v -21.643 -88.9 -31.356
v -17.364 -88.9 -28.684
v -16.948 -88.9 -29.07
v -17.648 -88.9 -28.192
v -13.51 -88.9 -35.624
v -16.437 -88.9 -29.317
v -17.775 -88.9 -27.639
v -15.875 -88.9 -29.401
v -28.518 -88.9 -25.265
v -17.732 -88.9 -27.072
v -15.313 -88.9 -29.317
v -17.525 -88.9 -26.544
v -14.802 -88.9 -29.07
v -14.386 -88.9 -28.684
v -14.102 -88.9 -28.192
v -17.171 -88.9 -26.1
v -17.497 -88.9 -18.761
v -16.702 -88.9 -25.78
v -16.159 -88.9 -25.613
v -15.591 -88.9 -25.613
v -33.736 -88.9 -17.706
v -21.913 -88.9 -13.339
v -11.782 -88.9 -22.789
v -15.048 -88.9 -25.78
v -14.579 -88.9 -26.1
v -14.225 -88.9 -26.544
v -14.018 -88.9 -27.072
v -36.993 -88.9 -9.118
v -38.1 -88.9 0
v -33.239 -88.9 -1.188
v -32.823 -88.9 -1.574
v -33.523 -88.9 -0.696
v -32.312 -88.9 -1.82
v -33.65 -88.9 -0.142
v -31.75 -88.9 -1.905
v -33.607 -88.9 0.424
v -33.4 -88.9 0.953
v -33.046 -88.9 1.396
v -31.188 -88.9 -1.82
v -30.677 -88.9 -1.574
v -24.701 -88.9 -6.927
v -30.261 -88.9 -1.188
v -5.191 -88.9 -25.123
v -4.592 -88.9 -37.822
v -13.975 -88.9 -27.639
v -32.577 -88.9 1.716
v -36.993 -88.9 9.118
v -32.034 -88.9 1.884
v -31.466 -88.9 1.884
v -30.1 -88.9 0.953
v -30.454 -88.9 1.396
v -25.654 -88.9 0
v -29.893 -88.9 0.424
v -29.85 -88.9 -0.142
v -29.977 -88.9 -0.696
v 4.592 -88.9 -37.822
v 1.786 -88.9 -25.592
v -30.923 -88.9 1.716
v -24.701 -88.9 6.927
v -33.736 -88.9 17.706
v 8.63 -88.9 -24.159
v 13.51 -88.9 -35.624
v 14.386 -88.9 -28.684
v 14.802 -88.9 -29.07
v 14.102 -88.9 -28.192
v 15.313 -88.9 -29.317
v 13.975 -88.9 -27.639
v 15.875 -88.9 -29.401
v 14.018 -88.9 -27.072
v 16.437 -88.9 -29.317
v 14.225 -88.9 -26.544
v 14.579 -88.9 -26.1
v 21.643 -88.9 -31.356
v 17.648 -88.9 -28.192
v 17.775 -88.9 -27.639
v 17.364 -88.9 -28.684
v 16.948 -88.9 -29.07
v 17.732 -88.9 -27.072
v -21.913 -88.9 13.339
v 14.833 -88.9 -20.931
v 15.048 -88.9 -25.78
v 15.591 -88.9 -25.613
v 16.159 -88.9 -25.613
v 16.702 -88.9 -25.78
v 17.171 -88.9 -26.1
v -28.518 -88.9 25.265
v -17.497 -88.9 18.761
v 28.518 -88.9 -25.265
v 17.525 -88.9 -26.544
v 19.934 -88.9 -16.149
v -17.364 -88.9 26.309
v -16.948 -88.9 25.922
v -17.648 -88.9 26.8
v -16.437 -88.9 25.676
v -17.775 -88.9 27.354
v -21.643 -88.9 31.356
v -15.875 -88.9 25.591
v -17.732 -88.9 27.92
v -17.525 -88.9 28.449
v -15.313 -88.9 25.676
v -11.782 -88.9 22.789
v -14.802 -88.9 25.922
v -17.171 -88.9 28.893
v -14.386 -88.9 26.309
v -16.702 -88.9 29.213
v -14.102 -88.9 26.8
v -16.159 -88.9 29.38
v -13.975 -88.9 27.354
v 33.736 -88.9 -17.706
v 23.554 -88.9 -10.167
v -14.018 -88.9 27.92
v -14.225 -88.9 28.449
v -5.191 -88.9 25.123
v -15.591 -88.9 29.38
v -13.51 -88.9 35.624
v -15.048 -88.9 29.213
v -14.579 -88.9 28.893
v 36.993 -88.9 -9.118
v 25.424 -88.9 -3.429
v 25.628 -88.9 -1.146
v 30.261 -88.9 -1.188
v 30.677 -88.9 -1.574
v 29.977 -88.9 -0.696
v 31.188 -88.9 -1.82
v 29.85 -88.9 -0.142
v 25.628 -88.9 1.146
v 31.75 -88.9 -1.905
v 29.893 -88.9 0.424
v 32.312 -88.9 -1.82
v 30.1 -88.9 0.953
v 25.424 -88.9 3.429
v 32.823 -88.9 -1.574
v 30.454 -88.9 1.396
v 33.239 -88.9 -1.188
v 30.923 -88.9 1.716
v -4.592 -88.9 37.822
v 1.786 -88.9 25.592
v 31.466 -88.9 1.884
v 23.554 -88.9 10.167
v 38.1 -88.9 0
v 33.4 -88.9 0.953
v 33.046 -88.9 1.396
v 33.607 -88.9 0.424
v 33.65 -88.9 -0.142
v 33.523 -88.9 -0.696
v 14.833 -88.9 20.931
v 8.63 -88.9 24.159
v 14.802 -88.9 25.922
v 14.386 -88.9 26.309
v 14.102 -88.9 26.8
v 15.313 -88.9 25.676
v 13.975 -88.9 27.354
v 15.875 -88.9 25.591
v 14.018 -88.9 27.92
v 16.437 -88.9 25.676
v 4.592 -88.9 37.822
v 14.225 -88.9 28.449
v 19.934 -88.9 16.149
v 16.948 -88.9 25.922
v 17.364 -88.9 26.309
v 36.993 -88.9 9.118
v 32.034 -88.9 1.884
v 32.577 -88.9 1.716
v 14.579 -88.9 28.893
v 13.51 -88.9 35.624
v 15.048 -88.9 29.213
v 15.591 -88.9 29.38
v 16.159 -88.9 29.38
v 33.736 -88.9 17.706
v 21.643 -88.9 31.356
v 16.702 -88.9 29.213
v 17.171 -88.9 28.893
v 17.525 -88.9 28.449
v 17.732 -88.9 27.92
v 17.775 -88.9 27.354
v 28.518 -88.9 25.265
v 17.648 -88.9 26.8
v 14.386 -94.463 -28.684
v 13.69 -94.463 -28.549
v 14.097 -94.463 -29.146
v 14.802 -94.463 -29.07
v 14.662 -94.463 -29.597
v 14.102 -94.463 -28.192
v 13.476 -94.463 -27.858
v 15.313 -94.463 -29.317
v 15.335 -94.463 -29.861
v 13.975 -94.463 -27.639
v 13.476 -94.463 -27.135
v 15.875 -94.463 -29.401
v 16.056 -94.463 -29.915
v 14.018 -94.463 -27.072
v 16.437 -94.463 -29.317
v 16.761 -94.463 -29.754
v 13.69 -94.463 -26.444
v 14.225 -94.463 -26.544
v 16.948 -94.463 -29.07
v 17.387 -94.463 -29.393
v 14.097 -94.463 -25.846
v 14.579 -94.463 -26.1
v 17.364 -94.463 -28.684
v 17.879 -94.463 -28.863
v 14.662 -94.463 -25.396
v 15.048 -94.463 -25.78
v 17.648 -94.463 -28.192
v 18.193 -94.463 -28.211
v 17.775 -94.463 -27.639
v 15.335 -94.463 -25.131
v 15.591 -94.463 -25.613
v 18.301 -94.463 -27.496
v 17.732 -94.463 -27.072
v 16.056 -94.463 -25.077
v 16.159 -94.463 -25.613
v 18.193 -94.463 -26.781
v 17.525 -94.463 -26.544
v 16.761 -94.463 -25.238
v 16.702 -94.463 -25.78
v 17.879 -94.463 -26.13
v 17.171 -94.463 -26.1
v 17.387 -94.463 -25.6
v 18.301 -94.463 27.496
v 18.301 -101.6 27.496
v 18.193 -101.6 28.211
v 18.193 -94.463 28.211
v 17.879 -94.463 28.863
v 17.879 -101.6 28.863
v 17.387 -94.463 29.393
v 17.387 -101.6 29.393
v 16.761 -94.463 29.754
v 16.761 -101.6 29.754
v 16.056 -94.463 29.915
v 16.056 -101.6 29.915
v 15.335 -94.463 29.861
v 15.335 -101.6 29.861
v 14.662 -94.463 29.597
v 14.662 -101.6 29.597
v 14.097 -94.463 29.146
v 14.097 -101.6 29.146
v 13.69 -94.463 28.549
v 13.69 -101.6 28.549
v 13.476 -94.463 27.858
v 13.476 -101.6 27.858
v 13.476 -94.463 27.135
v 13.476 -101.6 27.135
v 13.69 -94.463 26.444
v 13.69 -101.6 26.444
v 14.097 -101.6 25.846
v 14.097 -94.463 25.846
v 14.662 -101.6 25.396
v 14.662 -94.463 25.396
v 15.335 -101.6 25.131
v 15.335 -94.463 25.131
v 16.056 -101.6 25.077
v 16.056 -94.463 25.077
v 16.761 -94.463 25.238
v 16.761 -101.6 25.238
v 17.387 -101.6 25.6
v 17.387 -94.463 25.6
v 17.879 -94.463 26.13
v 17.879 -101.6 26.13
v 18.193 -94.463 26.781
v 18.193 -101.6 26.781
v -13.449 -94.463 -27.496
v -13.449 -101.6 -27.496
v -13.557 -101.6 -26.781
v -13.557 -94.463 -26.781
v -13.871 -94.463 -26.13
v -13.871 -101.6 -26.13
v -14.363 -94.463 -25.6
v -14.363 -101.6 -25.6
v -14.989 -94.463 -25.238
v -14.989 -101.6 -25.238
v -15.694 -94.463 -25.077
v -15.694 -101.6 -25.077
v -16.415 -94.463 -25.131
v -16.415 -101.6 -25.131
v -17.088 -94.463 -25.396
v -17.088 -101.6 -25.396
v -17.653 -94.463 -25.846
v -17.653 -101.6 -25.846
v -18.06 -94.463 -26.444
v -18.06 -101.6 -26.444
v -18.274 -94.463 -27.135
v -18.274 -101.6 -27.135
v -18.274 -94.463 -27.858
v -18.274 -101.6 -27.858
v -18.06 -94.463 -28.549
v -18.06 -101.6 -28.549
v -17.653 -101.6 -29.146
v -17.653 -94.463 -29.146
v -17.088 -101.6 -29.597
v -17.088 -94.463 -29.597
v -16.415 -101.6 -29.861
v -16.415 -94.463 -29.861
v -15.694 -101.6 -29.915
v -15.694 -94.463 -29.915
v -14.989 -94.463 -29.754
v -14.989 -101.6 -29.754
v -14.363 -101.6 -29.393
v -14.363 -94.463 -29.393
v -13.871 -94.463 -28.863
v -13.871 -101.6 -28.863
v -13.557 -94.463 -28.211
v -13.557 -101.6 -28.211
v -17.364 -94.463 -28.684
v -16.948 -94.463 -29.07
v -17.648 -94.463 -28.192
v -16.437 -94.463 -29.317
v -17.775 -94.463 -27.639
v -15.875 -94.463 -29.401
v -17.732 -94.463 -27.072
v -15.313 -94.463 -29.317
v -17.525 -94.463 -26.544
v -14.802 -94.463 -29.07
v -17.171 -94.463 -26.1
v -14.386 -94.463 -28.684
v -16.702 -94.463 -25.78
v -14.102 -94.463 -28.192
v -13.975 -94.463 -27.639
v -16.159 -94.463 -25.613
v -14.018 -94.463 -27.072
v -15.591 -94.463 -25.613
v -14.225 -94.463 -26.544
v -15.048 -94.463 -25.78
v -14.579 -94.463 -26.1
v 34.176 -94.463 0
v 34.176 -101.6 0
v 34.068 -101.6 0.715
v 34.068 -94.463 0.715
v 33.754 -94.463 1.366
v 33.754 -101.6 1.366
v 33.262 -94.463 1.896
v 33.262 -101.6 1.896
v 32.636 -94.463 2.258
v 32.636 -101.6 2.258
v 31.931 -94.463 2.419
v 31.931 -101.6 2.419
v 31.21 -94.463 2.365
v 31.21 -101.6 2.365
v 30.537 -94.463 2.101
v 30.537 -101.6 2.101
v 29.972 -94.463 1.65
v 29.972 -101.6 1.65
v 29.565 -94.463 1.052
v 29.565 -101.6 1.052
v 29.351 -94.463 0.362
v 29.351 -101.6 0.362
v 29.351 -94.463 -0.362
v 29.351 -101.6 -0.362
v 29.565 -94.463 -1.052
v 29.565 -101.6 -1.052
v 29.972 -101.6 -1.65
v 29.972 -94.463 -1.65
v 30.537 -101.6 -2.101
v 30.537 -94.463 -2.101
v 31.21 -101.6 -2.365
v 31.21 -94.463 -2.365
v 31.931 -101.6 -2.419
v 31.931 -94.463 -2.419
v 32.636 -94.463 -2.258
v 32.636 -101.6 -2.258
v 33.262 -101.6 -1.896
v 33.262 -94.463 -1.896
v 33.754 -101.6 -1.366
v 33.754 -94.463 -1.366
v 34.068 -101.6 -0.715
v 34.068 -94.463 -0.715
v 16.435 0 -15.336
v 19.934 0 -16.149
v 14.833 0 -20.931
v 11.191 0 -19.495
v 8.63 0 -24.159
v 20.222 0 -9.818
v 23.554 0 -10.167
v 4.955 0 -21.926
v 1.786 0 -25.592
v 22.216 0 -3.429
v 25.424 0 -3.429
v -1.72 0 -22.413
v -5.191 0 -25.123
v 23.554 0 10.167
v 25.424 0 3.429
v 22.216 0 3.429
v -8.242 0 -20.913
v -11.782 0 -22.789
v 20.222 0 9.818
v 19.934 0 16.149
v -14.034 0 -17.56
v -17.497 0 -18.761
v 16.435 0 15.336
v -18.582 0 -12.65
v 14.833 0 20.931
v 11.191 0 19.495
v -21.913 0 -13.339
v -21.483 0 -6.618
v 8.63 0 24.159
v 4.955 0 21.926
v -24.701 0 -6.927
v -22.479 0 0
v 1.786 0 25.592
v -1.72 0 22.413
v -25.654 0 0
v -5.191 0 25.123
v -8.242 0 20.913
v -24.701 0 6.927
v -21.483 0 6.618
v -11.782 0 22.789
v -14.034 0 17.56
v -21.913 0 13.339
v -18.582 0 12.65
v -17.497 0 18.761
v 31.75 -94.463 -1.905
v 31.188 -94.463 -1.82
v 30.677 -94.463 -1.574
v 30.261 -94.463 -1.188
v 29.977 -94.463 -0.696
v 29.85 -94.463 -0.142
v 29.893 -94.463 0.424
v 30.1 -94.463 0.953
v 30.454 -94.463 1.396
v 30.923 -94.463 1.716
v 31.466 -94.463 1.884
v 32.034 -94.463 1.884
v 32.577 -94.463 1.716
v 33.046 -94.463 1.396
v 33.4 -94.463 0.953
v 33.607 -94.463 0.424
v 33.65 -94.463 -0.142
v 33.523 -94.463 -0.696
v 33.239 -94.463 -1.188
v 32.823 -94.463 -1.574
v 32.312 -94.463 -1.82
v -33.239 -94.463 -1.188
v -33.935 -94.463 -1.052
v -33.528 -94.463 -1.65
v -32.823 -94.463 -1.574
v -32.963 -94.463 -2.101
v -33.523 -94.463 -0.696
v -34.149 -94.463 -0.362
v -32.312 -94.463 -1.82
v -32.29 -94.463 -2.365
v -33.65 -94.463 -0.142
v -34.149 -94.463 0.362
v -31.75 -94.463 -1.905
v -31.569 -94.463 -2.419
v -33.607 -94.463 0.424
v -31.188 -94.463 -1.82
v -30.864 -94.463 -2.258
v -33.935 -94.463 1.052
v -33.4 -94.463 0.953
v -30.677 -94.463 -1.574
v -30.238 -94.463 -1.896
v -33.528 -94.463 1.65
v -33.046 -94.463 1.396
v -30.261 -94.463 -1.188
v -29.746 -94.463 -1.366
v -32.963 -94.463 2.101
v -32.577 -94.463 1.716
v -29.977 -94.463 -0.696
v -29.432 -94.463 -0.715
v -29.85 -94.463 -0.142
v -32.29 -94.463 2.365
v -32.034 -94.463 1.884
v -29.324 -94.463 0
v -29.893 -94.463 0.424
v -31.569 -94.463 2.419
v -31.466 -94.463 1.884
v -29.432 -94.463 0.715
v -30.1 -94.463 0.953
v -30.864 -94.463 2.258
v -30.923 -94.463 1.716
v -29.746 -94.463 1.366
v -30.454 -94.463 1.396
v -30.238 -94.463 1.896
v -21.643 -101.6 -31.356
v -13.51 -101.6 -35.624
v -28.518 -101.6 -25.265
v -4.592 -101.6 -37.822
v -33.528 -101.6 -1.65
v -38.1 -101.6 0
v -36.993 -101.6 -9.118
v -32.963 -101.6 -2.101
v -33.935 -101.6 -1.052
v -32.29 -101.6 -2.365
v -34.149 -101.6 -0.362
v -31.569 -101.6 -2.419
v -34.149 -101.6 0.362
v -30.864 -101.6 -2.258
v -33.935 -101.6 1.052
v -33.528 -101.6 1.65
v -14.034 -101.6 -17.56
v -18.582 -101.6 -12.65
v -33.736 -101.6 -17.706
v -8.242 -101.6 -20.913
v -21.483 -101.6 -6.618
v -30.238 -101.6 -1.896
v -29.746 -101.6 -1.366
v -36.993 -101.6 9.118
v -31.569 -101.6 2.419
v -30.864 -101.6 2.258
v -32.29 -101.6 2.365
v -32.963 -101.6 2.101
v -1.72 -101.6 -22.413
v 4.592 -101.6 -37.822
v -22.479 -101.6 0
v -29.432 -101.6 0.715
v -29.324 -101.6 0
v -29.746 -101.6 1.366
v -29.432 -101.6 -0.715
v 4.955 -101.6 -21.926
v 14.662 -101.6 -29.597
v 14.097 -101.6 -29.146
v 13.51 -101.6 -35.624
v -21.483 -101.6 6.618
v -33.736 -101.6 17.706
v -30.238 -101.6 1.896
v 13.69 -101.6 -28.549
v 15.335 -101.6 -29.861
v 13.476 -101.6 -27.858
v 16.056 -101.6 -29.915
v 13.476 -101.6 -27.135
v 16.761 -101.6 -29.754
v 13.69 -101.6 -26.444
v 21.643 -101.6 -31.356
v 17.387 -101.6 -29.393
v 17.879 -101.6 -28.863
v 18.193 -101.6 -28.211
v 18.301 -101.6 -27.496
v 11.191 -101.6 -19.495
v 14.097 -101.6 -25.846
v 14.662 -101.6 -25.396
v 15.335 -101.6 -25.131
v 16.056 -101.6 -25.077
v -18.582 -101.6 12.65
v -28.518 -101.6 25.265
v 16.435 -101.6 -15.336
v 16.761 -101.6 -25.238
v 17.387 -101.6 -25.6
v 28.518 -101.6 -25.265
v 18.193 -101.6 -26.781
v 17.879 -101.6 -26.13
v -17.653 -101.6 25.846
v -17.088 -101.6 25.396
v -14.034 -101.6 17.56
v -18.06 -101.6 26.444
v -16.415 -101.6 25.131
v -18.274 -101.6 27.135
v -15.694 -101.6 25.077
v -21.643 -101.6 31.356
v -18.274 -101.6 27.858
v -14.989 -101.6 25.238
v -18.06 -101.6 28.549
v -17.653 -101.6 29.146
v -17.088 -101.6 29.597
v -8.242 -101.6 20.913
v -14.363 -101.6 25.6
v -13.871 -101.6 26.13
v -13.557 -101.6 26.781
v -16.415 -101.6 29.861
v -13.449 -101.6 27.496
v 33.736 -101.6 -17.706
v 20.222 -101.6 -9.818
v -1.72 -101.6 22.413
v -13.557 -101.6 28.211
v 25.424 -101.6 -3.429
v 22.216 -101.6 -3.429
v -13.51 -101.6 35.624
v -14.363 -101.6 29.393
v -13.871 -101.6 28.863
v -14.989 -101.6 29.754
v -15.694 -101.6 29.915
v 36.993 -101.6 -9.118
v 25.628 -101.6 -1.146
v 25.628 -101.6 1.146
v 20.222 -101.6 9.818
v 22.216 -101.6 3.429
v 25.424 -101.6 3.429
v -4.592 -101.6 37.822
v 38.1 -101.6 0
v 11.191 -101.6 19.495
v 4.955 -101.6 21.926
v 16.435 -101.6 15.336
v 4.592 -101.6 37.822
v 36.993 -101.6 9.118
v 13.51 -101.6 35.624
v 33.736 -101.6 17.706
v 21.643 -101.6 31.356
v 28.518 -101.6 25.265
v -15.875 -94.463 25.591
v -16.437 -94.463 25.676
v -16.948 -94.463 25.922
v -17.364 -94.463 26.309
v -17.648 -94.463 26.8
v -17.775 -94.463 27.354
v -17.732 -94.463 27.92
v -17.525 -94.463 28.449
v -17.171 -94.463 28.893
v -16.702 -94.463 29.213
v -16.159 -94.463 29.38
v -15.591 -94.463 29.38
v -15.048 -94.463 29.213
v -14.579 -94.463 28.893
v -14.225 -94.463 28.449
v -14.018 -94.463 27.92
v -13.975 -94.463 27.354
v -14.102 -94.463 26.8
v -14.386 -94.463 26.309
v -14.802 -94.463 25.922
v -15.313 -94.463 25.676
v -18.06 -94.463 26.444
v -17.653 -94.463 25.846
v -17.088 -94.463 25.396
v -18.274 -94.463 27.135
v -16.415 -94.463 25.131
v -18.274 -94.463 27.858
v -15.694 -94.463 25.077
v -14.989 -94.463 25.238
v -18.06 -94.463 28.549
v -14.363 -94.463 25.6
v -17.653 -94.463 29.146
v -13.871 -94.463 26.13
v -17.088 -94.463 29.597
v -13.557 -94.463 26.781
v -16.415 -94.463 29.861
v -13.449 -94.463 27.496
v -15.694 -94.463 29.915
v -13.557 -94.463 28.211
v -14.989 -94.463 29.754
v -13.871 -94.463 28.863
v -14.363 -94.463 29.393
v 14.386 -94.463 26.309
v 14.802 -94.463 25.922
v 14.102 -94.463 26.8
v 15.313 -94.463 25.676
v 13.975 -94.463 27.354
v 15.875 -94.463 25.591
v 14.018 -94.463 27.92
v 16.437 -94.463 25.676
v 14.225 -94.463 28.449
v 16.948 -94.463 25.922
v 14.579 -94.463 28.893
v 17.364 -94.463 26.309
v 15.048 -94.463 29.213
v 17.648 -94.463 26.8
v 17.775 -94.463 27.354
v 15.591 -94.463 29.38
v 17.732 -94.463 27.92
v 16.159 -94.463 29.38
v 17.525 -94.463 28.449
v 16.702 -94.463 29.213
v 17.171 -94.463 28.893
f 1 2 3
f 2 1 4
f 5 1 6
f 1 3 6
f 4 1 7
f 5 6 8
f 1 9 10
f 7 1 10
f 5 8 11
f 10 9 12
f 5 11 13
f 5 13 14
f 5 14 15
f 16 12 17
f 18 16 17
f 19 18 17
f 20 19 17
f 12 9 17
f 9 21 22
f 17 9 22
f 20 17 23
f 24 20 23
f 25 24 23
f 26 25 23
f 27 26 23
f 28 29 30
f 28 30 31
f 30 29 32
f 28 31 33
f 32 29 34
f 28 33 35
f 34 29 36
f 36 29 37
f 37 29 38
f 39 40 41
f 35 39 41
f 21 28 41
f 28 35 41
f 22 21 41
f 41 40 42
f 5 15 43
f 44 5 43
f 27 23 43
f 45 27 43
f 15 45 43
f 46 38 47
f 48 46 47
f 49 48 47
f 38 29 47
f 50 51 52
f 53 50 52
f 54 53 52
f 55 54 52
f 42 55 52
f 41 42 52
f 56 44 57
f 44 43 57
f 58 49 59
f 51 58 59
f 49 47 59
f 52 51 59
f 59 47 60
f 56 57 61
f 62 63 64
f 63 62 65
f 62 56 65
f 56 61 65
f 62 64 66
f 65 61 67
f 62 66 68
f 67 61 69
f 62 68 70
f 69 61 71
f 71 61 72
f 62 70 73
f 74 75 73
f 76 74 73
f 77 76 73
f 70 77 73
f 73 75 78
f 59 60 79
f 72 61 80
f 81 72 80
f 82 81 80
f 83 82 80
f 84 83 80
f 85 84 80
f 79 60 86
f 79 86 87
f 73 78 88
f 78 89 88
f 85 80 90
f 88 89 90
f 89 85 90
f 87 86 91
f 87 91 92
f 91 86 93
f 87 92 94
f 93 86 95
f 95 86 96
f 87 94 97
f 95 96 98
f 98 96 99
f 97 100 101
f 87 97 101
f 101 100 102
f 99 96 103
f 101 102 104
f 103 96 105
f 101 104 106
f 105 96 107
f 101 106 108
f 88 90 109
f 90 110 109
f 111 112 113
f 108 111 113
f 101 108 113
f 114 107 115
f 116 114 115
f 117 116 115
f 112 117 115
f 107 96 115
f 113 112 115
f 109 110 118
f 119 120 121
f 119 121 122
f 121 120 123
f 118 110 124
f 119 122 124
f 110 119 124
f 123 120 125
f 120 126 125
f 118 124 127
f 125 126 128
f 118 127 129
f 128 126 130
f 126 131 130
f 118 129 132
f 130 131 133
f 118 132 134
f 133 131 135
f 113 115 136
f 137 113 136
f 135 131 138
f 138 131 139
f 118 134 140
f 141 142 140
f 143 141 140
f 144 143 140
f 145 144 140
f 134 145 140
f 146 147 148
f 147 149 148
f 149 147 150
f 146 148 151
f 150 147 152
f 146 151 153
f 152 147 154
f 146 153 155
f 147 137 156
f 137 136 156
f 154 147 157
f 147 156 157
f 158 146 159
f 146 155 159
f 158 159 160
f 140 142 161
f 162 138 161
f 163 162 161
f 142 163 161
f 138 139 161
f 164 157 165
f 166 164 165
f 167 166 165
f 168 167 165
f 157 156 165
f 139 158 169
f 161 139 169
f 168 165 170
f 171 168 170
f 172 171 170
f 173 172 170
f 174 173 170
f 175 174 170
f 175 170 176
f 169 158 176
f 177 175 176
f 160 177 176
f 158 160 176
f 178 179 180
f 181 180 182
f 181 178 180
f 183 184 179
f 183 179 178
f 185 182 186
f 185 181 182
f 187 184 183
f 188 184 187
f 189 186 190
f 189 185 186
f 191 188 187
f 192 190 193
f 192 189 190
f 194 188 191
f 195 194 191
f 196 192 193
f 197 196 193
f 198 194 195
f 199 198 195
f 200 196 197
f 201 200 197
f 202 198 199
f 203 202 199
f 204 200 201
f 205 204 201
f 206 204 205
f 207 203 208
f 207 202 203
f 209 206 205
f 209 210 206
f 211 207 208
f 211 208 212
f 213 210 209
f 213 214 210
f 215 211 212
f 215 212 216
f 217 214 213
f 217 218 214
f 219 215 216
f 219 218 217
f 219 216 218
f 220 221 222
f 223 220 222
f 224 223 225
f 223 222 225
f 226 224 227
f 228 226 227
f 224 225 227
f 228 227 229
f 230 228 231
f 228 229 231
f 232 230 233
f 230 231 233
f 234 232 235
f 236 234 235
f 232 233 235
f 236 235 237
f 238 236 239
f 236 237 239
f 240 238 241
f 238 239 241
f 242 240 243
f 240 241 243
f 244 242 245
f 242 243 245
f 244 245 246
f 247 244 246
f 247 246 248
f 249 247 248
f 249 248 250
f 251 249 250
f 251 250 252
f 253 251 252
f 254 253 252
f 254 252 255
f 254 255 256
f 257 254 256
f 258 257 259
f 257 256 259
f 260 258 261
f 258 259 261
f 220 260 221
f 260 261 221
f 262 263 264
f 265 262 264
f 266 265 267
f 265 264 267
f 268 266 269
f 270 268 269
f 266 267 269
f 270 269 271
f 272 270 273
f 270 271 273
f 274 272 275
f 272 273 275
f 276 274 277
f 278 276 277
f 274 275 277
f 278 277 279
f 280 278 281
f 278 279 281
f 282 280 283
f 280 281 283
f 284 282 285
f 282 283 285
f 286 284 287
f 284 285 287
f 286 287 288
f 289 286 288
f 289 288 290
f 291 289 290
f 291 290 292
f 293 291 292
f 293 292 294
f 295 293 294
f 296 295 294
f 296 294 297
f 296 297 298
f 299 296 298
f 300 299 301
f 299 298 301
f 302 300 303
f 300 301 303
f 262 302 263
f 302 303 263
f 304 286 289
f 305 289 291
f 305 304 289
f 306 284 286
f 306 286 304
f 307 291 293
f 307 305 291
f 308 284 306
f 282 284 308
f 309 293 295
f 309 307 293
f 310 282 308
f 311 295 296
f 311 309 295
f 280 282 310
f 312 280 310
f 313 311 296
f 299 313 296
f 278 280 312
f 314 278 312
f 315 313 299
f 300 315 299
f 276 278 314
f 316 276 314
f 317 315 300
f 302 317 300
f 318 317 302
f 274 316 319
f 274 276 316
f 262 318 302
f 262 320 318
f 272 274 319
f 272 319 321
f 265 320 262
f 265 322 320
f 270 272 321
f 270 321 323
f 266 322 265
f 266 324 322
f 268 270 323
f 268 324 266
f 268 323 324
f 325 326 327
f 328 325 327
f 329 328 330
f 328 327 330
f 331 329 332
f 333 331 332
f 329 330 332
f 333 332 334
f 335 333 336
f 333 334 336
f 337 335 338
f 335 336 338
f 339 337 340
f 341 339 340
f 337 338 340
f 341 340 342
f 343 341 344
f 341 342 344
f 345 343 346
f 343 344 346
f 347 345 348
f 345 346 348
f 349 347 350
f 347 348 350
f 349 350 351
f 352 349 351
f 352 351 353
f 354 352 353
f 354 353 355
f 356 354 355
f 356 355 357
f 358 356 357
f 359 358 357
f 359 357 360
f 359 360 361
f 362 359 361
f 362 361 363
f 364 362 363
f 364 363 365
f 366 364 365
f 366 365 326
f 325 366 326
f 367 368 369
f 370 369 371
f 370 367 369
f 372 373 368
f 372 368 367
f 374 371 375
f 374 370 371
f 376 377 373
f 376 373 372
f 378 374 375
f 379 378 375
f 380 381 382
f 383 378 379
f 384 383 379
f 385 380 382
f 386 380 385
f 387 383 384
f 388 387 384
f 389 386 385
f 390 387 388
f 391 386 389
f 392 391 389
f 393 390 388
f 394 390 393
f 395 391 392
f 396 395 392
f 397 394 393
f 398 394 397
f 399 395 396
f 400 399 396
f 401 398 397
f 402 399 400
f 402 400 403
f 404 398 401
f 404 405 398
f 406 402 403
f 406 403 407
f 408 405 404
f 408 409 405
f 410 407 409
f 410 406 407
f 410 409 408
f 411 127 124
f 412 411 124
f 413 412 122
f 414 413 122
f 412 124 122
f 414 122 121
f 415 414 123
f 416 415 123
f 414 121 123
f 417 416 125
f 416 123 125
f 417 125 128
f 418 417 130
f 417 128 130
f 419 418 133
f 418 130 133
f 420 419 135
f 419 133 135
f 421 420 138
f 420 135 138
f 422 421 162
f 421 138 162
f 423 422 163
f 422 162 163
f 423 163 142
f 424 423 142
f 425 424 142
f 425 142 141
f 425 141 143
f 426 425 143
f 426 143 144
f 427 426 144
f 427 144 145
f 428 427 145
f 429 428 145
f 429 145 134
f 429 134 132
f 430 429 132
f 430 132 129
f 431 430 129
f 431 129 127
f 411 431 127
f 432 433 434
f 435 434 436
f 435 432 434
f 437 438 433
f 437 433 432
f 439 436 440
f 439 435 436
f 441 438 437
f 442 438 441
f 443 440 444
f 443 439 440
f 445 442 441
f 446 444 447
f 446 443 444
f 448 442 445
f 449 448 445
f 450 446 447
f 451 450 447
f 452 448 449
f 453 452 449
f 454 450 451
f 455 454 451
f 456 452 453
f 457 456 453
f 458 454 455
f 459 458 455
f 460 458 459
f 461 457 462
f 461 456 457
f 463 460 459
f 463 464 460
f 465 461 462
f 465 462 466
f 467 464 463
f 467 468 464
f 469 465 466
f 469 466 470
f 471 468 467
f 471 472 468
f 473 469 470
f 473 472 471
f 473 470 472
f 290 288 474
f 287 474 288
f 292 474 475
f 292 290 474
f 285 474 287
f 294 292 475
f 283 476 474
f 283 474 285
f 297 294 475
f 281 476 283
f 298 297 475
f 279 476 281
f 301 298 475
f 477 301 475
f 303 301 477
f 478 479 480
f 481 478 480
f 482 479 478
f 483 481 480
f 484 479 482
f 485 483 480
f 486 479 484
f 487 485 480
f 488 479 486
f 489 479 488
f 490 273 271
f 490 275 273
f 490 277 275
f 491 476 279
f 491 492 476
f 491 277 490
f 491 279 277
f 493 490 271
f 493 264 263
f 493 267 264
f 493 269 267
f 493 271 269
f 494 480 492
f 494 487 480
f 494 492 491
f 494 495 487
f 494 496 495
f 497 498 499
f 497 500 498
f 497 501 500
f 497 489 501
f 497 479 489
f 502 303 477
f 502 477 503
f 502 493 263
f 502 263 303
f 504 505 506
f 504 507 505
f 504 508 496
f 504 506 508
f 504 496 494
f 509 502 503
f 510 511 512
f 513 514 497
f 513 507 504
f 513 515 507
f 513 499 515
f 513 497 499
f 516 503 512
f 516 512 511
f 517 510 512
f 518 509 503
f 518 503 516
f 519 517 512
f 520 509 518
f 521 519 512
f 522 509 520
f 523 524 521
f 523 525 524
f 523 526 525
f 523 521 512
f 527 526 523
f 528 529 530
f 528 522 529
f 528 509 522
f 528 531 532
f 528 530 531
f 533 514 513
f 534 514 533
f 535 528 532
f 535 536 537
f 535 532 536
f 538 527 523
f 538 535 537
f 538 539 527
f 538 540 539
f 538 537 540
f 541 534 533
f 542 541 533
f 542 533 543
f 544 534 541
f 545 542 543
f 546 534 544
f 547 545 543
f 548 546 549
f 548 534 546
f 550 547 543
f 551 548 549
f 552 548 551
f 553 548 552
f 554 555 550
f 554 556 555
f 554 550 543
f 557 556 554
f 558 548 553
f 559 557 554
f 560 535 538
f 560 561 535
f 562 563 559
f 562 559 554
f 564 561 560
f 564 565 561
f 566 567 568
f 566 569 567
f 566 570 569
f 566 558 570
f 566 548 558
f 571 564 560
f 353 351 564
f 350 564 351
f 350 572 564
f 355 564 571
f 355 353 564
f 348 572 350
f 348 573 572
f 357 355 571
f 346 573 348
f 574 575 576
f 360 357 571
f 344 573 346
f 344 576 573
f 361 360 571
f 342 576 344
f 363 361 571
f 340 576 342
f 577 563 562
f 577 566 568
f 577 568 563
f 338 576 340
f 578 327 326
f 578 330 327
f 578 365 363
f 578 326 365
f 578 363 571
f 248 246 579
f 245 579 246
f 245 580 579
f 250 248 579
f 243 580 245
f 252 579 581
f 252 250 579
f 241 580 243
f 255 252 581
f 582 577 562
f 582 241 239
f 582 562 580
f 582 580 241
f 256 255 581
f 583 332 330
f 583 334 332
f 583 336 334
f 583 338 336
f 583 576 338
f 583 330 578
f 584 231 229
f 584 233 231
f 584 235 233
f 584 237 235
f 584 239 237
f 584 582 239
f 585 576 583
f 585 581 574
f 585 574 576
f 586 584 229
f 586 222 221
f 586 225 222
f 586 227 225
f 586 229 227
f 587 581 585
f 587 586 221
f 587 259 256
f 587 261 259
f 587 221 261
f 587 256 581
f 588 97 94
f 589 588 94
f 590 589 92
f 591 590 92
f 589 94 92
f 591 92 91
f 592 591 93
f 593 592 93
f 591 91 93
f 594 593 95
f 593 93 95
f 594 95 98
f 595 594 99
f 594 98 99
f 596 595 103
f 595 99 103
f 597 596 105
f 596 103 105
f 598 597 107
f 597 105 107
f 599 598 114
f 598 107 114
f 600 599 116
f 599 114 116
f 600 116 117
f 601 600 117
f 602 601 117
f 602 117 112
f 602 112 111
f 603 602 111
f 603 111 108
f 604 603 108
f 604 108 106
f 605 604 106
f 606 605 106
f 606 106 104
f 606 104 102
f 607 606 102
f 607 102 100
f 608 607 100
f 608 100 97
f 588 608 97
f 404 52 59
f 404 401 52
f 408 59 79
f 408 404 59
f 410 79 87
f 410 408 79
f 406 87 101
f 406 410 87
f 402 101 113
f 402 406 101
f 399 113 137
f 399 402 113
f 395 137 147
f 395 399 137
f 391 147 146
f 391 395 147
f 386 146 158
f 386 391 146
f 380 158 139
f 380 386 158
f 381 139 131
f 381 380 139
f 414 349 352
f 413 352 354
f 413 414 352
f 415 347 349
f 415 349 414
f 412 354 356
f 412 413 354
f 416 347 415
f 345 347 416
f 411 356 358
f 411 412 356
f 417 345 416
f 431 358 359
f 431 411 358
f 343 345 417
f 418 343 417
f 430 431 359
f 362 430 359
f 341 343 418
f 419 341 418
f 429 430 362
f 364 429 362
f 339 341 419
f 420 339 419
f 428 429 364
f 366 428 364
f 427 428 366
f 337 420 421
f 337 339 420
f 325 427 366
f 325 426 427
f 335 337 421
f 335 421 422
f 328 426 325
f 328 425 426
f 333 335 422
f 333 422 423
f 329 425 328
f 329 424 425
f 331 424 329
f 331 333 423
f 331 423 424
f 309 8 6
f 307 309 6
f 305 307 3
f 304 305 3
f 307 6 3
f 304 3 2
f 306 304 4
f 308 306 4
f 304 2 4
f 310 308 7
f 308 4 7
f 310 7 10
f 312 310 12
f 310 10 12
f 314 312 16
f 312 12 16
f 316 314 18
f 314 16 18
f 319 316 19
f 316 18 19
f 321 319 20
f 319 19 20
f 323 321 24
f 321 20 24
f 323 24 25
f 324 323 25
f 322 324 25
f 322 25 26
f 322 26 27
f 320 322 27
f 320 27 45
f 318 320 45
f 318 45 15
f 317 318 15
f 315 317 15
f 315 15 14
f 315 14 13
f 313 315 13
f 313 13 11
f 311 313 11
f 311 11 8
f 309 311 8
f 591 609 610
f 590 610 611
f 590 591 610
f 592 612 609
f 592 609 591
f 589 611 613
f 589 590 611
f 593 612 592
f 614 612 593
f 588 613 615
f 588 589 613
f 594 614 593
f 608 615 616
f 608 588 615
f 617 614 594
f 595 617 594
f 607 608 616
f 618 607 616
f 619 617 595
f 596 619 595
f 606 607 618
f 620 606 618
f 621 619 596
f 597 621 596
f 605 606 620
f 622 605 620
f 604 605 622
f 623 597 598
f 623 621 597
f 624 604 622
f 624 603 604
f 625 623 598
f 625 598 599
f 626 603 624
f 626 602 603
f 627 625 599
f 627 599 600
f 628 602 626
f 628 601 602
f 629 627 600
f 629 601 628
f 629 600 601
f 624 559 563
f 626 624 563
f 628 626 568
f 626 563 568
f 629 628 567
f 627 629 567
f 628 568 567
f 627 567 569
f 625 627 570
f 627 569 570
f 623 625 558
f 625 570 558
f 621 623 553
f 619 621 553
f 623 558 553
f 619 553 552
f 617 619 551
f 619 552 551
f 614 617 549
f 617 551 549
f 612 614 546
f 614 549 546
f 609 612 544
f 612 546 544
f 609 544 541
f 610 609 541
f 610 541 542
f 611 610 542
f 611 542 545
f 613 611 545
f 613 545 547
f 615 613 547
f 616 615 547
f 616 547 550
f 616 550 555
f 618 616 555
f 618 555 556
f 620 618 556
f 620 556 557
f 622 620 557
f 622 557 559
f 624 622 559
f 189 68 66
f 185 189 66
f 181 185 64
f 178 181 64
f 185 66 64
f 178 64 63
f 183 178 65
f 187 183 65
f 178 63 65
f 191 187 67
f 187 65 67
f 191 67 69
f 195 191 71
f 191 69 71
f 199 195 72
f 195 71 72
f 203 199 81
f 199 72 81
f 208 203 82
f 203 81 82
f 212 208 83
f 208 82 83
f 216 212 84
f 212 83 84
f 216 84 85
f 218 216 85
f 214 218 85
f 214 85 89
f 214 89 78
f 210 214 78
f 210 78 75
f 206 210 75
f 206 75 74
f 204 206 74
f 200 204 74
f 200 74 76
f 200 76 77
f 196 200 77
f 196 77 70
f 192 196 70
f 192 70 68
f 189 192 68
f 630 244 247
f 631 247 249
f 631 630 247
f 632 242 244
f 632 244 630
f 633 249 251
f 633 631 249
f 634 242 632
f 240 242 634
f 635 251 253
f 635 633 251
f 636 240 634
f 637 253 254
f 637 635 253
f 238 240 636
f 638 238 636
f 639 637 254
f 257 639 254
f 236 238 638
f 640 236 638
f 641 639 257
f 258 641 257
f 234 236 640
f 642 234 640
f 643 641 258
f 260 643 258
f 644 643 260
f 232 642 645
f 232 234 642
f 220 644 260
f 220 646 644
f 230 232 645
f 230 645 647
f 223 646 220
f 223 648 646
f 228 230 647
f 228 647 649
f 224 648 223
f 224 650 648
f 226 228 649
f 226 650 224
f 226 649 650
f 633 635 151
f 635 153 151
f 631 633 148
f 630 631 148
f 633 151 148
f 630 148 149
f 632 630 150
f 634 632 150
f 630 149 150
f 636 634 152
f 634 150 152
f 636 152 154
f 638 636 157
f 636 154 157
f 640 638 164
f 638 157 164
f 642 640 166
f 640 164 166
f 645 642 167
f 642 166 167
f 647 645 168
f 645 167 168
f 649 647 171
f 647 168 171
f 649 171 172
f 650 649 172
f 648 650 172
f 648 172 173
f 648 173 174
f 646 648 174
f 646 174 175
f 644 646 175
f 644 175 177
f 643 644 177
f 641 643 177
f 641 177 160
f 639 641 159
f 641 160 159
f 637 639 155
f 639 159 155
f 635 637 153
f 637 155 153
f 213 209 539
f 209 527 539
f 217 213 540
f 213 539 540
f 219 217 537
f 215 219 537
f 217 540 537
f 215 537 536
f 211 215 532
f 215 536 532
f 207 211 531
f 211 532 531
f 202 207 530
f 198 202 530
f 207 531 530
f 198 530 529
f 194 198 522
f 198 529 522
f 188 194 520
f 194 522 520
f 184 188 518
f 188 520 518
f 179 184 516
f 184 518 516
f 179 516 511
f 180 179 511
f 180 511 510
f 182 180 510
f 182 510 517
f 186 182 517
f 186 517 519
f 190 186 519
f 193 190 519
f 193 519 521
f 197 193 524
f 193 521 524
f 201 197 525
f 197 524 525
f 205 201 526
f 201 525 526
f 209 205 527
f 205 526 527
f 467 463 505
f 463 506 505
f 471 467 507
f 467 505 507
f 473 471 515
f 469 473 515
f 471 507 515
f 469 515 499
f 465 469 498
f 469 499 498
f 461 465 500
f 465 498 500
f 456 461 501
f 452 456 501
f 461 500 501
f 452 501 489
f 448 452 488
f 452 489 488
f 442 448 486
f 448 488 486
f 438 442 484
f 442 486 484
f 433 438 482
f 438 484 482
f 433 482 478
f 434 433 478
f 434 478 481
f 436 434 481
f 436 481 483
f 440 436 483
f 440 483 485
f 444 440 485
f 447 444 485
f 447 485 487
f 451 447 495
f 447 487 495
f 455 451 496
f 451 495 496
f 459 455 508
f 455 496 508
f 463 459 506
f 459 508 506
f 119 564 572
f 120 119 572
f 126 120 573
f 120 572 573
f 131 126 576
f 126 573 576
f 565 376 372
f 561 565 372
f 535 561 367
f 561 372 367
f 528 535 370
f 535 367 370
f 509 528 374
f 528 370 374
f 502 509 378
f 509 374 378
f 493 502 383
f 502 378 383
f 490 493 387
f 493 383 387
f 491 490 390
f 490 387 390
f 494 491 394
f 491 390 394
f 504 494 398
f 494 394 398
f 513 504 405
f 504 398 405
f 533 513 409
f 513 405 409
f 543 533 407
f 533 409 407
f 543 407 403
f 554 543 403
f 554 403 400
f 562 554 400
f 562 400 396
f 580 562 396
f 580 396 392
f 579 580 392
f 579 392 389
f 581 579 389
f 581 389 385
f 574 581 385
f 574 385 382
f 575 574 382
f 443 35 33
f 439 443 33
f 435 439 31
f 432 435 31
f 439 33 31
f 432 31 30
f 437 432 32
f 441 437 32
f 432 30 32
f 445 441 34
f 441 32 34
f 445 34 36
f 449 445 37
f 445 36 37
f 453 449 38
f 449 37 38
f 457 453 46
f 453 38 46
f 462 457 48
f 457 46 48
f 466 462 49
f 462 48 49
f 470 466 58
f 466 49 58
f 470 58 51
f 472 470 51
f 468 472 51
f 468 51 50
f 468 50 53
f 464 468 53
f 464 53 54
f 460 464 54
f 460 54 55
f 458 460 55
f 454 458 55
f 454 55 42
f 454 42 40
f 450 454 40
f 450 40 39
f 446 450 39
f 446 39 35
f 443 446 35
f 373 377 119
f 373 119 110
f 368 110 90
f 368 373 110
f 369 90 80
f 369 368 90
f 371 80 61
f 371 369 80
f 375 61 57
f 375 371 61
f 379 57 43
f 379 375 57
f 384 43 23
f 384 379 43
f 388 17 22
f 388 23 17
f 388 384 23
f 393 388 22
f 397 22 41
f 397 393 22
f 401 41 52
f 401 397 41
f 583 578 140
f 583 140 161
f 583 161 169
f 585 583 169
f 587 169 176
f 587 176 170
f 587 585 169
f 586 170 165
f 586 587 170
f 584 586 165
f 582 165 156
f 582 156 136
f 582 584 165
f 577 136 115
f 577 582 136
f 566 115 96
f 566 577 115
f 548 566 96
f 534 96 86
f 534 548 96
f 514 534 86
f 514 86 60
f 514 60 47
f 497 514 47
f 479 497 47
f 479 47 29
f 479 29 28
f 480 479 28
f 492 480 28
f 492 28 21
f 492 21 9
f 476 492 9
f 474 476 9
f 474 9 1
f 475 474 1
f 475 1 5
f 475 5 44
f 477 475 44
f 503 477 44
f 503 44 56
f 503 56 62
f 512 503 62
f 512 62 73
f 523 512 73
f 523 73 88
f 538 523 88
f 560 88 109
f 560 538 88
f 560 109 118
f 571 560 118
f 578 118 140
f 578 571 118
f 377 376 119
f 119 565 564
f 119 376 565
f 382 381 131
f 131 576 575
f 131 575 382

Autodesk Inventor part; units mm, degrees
ref_plane "YZ Plane" through (0, 0, 0) normal (1, 0, 0) x (0, 1, 0)
ref_plane "XZ Plane" through (0, 0, 0) normal (0, 1, 0) x (-1, 0, 0)
ref_plane "XY Plane" through (0, 0, 0) normal (0, 0, 1) x (1, 0, 0)
sketch "Sketch1" plane through (0, 0, 0) normal (0, 1, 0) x (-1, 0, 0)
  circle A0 centre (0, 0) radius 22.479
  circle A1 centre (0, 0) radius 25.654
  dimension "d0" = 44.958
  dimension "d1" = 51.308
extrude "Extrusion1" add sketch "Sketch1" against normal blind 101.6
sketch "Sketch7" plane through (0, -101.6, 0) normal (0, -1, 0) x (1, 0, 0)
  line L0 (0, 0) -> (25.654, 0) construction
  circle A0 centre (0, 0) radius 25.654 construction
  line L1 (19.304, 3.429) -> (19.304, -3.429)
  line L2 (19.304, -3.429) -> (25.654, -3.429)
  line L3 (25.654, -3.429) -> (25.654, 3.429)
  line L4 (25.654, 3.429) -> (19.304, 3.429)
  circle A1 centre (0, 0) radius 22.479 projected
  line L5 (19.304, 3.429) -> (25.654, -3.429) construction
  line L6 (19.304, -3.429) -> (25.654, 3.429) construction
  point P0 (20.2202, 0)
  point P1 (22.479, 0)
  dimension "d10" = 6.858
  dimension "d11" = 6.35
extrude "Extrusion2" cut sketch "Sketch7" against normal blind 101.6 contours L4 A1 L2 L1 | L4 L3 L2 A1 picked at (20.3623, 0)
sketch "Sketch8" plane through (0, -101.6, 0) normal (0, -1, 0) x (1, 0, 0)
  circle A0 centre (0, 0) radius 25.654
  circle A1 centre (0, 0) radius 38.1
  dimension "d14" = 51.308
  dimension "d15" = 76.2
extrude "Extrusion3" add sketch "Sketch8" against normal blind 12.7
sketch "Sketch10" plane through (0, -101.6, 0) normal (0, -1, 0) x (1, 0, 0)
  circle A0 centre (31.75, 0) radius 2.4257
  circle A1 centre (15.875, 27.4963) radius 2.4257
  circle A2 centre (-15.875, 27.4963) radius 2.4257
  circle A3 centre (-31.75, 0) radius 2.4257
  circle A4 centre (-15.875, -27.4963) radius 2.4257
  circle A5 centre (15.875, -27.4963) radius 2.4257
  point P0 (0, 0)
  dimension "d30" = 4.8514
  dimension "d33" = 360
extrude "Extrusion4" cut sketch "Sketch10" against normal blind 7.1374
sketch "Sketch11" plane through (31.75, -94.4626, 0) normal (0, -1, 0) x (1, 0, 0)
  point P0 (-31.75, 0)
  point P1 (0, 0)
  point P2 (-15.875, 27.4963)
  point P3 (-47.625, 27.4963)
  point P4 (-63.5, 0)
  point P5 (-47.625, -27.4963)
  point P6 (-15.875, -27.4963)
  dimension "d39" = 360
hole "Hole2" at (31.75, -94.4626, 0) at (15.875, -94.4626, 27.4963) at (-15.875, -94.4626, 27.4963) at (-31.75, -94.4626, 0) at (-15.875, -94.4626, -27.4963) at (15.875, -94.4626, -27.4963) direction (0, 1, 0) diameter 3.81 end through all clearance for "Flat Head Machine Screw (82)" size "#6" standard "Ansi Unified Screw Threads"
properties part number "ExternalStationaryOuterRingOld" material "LCP Plastic"
